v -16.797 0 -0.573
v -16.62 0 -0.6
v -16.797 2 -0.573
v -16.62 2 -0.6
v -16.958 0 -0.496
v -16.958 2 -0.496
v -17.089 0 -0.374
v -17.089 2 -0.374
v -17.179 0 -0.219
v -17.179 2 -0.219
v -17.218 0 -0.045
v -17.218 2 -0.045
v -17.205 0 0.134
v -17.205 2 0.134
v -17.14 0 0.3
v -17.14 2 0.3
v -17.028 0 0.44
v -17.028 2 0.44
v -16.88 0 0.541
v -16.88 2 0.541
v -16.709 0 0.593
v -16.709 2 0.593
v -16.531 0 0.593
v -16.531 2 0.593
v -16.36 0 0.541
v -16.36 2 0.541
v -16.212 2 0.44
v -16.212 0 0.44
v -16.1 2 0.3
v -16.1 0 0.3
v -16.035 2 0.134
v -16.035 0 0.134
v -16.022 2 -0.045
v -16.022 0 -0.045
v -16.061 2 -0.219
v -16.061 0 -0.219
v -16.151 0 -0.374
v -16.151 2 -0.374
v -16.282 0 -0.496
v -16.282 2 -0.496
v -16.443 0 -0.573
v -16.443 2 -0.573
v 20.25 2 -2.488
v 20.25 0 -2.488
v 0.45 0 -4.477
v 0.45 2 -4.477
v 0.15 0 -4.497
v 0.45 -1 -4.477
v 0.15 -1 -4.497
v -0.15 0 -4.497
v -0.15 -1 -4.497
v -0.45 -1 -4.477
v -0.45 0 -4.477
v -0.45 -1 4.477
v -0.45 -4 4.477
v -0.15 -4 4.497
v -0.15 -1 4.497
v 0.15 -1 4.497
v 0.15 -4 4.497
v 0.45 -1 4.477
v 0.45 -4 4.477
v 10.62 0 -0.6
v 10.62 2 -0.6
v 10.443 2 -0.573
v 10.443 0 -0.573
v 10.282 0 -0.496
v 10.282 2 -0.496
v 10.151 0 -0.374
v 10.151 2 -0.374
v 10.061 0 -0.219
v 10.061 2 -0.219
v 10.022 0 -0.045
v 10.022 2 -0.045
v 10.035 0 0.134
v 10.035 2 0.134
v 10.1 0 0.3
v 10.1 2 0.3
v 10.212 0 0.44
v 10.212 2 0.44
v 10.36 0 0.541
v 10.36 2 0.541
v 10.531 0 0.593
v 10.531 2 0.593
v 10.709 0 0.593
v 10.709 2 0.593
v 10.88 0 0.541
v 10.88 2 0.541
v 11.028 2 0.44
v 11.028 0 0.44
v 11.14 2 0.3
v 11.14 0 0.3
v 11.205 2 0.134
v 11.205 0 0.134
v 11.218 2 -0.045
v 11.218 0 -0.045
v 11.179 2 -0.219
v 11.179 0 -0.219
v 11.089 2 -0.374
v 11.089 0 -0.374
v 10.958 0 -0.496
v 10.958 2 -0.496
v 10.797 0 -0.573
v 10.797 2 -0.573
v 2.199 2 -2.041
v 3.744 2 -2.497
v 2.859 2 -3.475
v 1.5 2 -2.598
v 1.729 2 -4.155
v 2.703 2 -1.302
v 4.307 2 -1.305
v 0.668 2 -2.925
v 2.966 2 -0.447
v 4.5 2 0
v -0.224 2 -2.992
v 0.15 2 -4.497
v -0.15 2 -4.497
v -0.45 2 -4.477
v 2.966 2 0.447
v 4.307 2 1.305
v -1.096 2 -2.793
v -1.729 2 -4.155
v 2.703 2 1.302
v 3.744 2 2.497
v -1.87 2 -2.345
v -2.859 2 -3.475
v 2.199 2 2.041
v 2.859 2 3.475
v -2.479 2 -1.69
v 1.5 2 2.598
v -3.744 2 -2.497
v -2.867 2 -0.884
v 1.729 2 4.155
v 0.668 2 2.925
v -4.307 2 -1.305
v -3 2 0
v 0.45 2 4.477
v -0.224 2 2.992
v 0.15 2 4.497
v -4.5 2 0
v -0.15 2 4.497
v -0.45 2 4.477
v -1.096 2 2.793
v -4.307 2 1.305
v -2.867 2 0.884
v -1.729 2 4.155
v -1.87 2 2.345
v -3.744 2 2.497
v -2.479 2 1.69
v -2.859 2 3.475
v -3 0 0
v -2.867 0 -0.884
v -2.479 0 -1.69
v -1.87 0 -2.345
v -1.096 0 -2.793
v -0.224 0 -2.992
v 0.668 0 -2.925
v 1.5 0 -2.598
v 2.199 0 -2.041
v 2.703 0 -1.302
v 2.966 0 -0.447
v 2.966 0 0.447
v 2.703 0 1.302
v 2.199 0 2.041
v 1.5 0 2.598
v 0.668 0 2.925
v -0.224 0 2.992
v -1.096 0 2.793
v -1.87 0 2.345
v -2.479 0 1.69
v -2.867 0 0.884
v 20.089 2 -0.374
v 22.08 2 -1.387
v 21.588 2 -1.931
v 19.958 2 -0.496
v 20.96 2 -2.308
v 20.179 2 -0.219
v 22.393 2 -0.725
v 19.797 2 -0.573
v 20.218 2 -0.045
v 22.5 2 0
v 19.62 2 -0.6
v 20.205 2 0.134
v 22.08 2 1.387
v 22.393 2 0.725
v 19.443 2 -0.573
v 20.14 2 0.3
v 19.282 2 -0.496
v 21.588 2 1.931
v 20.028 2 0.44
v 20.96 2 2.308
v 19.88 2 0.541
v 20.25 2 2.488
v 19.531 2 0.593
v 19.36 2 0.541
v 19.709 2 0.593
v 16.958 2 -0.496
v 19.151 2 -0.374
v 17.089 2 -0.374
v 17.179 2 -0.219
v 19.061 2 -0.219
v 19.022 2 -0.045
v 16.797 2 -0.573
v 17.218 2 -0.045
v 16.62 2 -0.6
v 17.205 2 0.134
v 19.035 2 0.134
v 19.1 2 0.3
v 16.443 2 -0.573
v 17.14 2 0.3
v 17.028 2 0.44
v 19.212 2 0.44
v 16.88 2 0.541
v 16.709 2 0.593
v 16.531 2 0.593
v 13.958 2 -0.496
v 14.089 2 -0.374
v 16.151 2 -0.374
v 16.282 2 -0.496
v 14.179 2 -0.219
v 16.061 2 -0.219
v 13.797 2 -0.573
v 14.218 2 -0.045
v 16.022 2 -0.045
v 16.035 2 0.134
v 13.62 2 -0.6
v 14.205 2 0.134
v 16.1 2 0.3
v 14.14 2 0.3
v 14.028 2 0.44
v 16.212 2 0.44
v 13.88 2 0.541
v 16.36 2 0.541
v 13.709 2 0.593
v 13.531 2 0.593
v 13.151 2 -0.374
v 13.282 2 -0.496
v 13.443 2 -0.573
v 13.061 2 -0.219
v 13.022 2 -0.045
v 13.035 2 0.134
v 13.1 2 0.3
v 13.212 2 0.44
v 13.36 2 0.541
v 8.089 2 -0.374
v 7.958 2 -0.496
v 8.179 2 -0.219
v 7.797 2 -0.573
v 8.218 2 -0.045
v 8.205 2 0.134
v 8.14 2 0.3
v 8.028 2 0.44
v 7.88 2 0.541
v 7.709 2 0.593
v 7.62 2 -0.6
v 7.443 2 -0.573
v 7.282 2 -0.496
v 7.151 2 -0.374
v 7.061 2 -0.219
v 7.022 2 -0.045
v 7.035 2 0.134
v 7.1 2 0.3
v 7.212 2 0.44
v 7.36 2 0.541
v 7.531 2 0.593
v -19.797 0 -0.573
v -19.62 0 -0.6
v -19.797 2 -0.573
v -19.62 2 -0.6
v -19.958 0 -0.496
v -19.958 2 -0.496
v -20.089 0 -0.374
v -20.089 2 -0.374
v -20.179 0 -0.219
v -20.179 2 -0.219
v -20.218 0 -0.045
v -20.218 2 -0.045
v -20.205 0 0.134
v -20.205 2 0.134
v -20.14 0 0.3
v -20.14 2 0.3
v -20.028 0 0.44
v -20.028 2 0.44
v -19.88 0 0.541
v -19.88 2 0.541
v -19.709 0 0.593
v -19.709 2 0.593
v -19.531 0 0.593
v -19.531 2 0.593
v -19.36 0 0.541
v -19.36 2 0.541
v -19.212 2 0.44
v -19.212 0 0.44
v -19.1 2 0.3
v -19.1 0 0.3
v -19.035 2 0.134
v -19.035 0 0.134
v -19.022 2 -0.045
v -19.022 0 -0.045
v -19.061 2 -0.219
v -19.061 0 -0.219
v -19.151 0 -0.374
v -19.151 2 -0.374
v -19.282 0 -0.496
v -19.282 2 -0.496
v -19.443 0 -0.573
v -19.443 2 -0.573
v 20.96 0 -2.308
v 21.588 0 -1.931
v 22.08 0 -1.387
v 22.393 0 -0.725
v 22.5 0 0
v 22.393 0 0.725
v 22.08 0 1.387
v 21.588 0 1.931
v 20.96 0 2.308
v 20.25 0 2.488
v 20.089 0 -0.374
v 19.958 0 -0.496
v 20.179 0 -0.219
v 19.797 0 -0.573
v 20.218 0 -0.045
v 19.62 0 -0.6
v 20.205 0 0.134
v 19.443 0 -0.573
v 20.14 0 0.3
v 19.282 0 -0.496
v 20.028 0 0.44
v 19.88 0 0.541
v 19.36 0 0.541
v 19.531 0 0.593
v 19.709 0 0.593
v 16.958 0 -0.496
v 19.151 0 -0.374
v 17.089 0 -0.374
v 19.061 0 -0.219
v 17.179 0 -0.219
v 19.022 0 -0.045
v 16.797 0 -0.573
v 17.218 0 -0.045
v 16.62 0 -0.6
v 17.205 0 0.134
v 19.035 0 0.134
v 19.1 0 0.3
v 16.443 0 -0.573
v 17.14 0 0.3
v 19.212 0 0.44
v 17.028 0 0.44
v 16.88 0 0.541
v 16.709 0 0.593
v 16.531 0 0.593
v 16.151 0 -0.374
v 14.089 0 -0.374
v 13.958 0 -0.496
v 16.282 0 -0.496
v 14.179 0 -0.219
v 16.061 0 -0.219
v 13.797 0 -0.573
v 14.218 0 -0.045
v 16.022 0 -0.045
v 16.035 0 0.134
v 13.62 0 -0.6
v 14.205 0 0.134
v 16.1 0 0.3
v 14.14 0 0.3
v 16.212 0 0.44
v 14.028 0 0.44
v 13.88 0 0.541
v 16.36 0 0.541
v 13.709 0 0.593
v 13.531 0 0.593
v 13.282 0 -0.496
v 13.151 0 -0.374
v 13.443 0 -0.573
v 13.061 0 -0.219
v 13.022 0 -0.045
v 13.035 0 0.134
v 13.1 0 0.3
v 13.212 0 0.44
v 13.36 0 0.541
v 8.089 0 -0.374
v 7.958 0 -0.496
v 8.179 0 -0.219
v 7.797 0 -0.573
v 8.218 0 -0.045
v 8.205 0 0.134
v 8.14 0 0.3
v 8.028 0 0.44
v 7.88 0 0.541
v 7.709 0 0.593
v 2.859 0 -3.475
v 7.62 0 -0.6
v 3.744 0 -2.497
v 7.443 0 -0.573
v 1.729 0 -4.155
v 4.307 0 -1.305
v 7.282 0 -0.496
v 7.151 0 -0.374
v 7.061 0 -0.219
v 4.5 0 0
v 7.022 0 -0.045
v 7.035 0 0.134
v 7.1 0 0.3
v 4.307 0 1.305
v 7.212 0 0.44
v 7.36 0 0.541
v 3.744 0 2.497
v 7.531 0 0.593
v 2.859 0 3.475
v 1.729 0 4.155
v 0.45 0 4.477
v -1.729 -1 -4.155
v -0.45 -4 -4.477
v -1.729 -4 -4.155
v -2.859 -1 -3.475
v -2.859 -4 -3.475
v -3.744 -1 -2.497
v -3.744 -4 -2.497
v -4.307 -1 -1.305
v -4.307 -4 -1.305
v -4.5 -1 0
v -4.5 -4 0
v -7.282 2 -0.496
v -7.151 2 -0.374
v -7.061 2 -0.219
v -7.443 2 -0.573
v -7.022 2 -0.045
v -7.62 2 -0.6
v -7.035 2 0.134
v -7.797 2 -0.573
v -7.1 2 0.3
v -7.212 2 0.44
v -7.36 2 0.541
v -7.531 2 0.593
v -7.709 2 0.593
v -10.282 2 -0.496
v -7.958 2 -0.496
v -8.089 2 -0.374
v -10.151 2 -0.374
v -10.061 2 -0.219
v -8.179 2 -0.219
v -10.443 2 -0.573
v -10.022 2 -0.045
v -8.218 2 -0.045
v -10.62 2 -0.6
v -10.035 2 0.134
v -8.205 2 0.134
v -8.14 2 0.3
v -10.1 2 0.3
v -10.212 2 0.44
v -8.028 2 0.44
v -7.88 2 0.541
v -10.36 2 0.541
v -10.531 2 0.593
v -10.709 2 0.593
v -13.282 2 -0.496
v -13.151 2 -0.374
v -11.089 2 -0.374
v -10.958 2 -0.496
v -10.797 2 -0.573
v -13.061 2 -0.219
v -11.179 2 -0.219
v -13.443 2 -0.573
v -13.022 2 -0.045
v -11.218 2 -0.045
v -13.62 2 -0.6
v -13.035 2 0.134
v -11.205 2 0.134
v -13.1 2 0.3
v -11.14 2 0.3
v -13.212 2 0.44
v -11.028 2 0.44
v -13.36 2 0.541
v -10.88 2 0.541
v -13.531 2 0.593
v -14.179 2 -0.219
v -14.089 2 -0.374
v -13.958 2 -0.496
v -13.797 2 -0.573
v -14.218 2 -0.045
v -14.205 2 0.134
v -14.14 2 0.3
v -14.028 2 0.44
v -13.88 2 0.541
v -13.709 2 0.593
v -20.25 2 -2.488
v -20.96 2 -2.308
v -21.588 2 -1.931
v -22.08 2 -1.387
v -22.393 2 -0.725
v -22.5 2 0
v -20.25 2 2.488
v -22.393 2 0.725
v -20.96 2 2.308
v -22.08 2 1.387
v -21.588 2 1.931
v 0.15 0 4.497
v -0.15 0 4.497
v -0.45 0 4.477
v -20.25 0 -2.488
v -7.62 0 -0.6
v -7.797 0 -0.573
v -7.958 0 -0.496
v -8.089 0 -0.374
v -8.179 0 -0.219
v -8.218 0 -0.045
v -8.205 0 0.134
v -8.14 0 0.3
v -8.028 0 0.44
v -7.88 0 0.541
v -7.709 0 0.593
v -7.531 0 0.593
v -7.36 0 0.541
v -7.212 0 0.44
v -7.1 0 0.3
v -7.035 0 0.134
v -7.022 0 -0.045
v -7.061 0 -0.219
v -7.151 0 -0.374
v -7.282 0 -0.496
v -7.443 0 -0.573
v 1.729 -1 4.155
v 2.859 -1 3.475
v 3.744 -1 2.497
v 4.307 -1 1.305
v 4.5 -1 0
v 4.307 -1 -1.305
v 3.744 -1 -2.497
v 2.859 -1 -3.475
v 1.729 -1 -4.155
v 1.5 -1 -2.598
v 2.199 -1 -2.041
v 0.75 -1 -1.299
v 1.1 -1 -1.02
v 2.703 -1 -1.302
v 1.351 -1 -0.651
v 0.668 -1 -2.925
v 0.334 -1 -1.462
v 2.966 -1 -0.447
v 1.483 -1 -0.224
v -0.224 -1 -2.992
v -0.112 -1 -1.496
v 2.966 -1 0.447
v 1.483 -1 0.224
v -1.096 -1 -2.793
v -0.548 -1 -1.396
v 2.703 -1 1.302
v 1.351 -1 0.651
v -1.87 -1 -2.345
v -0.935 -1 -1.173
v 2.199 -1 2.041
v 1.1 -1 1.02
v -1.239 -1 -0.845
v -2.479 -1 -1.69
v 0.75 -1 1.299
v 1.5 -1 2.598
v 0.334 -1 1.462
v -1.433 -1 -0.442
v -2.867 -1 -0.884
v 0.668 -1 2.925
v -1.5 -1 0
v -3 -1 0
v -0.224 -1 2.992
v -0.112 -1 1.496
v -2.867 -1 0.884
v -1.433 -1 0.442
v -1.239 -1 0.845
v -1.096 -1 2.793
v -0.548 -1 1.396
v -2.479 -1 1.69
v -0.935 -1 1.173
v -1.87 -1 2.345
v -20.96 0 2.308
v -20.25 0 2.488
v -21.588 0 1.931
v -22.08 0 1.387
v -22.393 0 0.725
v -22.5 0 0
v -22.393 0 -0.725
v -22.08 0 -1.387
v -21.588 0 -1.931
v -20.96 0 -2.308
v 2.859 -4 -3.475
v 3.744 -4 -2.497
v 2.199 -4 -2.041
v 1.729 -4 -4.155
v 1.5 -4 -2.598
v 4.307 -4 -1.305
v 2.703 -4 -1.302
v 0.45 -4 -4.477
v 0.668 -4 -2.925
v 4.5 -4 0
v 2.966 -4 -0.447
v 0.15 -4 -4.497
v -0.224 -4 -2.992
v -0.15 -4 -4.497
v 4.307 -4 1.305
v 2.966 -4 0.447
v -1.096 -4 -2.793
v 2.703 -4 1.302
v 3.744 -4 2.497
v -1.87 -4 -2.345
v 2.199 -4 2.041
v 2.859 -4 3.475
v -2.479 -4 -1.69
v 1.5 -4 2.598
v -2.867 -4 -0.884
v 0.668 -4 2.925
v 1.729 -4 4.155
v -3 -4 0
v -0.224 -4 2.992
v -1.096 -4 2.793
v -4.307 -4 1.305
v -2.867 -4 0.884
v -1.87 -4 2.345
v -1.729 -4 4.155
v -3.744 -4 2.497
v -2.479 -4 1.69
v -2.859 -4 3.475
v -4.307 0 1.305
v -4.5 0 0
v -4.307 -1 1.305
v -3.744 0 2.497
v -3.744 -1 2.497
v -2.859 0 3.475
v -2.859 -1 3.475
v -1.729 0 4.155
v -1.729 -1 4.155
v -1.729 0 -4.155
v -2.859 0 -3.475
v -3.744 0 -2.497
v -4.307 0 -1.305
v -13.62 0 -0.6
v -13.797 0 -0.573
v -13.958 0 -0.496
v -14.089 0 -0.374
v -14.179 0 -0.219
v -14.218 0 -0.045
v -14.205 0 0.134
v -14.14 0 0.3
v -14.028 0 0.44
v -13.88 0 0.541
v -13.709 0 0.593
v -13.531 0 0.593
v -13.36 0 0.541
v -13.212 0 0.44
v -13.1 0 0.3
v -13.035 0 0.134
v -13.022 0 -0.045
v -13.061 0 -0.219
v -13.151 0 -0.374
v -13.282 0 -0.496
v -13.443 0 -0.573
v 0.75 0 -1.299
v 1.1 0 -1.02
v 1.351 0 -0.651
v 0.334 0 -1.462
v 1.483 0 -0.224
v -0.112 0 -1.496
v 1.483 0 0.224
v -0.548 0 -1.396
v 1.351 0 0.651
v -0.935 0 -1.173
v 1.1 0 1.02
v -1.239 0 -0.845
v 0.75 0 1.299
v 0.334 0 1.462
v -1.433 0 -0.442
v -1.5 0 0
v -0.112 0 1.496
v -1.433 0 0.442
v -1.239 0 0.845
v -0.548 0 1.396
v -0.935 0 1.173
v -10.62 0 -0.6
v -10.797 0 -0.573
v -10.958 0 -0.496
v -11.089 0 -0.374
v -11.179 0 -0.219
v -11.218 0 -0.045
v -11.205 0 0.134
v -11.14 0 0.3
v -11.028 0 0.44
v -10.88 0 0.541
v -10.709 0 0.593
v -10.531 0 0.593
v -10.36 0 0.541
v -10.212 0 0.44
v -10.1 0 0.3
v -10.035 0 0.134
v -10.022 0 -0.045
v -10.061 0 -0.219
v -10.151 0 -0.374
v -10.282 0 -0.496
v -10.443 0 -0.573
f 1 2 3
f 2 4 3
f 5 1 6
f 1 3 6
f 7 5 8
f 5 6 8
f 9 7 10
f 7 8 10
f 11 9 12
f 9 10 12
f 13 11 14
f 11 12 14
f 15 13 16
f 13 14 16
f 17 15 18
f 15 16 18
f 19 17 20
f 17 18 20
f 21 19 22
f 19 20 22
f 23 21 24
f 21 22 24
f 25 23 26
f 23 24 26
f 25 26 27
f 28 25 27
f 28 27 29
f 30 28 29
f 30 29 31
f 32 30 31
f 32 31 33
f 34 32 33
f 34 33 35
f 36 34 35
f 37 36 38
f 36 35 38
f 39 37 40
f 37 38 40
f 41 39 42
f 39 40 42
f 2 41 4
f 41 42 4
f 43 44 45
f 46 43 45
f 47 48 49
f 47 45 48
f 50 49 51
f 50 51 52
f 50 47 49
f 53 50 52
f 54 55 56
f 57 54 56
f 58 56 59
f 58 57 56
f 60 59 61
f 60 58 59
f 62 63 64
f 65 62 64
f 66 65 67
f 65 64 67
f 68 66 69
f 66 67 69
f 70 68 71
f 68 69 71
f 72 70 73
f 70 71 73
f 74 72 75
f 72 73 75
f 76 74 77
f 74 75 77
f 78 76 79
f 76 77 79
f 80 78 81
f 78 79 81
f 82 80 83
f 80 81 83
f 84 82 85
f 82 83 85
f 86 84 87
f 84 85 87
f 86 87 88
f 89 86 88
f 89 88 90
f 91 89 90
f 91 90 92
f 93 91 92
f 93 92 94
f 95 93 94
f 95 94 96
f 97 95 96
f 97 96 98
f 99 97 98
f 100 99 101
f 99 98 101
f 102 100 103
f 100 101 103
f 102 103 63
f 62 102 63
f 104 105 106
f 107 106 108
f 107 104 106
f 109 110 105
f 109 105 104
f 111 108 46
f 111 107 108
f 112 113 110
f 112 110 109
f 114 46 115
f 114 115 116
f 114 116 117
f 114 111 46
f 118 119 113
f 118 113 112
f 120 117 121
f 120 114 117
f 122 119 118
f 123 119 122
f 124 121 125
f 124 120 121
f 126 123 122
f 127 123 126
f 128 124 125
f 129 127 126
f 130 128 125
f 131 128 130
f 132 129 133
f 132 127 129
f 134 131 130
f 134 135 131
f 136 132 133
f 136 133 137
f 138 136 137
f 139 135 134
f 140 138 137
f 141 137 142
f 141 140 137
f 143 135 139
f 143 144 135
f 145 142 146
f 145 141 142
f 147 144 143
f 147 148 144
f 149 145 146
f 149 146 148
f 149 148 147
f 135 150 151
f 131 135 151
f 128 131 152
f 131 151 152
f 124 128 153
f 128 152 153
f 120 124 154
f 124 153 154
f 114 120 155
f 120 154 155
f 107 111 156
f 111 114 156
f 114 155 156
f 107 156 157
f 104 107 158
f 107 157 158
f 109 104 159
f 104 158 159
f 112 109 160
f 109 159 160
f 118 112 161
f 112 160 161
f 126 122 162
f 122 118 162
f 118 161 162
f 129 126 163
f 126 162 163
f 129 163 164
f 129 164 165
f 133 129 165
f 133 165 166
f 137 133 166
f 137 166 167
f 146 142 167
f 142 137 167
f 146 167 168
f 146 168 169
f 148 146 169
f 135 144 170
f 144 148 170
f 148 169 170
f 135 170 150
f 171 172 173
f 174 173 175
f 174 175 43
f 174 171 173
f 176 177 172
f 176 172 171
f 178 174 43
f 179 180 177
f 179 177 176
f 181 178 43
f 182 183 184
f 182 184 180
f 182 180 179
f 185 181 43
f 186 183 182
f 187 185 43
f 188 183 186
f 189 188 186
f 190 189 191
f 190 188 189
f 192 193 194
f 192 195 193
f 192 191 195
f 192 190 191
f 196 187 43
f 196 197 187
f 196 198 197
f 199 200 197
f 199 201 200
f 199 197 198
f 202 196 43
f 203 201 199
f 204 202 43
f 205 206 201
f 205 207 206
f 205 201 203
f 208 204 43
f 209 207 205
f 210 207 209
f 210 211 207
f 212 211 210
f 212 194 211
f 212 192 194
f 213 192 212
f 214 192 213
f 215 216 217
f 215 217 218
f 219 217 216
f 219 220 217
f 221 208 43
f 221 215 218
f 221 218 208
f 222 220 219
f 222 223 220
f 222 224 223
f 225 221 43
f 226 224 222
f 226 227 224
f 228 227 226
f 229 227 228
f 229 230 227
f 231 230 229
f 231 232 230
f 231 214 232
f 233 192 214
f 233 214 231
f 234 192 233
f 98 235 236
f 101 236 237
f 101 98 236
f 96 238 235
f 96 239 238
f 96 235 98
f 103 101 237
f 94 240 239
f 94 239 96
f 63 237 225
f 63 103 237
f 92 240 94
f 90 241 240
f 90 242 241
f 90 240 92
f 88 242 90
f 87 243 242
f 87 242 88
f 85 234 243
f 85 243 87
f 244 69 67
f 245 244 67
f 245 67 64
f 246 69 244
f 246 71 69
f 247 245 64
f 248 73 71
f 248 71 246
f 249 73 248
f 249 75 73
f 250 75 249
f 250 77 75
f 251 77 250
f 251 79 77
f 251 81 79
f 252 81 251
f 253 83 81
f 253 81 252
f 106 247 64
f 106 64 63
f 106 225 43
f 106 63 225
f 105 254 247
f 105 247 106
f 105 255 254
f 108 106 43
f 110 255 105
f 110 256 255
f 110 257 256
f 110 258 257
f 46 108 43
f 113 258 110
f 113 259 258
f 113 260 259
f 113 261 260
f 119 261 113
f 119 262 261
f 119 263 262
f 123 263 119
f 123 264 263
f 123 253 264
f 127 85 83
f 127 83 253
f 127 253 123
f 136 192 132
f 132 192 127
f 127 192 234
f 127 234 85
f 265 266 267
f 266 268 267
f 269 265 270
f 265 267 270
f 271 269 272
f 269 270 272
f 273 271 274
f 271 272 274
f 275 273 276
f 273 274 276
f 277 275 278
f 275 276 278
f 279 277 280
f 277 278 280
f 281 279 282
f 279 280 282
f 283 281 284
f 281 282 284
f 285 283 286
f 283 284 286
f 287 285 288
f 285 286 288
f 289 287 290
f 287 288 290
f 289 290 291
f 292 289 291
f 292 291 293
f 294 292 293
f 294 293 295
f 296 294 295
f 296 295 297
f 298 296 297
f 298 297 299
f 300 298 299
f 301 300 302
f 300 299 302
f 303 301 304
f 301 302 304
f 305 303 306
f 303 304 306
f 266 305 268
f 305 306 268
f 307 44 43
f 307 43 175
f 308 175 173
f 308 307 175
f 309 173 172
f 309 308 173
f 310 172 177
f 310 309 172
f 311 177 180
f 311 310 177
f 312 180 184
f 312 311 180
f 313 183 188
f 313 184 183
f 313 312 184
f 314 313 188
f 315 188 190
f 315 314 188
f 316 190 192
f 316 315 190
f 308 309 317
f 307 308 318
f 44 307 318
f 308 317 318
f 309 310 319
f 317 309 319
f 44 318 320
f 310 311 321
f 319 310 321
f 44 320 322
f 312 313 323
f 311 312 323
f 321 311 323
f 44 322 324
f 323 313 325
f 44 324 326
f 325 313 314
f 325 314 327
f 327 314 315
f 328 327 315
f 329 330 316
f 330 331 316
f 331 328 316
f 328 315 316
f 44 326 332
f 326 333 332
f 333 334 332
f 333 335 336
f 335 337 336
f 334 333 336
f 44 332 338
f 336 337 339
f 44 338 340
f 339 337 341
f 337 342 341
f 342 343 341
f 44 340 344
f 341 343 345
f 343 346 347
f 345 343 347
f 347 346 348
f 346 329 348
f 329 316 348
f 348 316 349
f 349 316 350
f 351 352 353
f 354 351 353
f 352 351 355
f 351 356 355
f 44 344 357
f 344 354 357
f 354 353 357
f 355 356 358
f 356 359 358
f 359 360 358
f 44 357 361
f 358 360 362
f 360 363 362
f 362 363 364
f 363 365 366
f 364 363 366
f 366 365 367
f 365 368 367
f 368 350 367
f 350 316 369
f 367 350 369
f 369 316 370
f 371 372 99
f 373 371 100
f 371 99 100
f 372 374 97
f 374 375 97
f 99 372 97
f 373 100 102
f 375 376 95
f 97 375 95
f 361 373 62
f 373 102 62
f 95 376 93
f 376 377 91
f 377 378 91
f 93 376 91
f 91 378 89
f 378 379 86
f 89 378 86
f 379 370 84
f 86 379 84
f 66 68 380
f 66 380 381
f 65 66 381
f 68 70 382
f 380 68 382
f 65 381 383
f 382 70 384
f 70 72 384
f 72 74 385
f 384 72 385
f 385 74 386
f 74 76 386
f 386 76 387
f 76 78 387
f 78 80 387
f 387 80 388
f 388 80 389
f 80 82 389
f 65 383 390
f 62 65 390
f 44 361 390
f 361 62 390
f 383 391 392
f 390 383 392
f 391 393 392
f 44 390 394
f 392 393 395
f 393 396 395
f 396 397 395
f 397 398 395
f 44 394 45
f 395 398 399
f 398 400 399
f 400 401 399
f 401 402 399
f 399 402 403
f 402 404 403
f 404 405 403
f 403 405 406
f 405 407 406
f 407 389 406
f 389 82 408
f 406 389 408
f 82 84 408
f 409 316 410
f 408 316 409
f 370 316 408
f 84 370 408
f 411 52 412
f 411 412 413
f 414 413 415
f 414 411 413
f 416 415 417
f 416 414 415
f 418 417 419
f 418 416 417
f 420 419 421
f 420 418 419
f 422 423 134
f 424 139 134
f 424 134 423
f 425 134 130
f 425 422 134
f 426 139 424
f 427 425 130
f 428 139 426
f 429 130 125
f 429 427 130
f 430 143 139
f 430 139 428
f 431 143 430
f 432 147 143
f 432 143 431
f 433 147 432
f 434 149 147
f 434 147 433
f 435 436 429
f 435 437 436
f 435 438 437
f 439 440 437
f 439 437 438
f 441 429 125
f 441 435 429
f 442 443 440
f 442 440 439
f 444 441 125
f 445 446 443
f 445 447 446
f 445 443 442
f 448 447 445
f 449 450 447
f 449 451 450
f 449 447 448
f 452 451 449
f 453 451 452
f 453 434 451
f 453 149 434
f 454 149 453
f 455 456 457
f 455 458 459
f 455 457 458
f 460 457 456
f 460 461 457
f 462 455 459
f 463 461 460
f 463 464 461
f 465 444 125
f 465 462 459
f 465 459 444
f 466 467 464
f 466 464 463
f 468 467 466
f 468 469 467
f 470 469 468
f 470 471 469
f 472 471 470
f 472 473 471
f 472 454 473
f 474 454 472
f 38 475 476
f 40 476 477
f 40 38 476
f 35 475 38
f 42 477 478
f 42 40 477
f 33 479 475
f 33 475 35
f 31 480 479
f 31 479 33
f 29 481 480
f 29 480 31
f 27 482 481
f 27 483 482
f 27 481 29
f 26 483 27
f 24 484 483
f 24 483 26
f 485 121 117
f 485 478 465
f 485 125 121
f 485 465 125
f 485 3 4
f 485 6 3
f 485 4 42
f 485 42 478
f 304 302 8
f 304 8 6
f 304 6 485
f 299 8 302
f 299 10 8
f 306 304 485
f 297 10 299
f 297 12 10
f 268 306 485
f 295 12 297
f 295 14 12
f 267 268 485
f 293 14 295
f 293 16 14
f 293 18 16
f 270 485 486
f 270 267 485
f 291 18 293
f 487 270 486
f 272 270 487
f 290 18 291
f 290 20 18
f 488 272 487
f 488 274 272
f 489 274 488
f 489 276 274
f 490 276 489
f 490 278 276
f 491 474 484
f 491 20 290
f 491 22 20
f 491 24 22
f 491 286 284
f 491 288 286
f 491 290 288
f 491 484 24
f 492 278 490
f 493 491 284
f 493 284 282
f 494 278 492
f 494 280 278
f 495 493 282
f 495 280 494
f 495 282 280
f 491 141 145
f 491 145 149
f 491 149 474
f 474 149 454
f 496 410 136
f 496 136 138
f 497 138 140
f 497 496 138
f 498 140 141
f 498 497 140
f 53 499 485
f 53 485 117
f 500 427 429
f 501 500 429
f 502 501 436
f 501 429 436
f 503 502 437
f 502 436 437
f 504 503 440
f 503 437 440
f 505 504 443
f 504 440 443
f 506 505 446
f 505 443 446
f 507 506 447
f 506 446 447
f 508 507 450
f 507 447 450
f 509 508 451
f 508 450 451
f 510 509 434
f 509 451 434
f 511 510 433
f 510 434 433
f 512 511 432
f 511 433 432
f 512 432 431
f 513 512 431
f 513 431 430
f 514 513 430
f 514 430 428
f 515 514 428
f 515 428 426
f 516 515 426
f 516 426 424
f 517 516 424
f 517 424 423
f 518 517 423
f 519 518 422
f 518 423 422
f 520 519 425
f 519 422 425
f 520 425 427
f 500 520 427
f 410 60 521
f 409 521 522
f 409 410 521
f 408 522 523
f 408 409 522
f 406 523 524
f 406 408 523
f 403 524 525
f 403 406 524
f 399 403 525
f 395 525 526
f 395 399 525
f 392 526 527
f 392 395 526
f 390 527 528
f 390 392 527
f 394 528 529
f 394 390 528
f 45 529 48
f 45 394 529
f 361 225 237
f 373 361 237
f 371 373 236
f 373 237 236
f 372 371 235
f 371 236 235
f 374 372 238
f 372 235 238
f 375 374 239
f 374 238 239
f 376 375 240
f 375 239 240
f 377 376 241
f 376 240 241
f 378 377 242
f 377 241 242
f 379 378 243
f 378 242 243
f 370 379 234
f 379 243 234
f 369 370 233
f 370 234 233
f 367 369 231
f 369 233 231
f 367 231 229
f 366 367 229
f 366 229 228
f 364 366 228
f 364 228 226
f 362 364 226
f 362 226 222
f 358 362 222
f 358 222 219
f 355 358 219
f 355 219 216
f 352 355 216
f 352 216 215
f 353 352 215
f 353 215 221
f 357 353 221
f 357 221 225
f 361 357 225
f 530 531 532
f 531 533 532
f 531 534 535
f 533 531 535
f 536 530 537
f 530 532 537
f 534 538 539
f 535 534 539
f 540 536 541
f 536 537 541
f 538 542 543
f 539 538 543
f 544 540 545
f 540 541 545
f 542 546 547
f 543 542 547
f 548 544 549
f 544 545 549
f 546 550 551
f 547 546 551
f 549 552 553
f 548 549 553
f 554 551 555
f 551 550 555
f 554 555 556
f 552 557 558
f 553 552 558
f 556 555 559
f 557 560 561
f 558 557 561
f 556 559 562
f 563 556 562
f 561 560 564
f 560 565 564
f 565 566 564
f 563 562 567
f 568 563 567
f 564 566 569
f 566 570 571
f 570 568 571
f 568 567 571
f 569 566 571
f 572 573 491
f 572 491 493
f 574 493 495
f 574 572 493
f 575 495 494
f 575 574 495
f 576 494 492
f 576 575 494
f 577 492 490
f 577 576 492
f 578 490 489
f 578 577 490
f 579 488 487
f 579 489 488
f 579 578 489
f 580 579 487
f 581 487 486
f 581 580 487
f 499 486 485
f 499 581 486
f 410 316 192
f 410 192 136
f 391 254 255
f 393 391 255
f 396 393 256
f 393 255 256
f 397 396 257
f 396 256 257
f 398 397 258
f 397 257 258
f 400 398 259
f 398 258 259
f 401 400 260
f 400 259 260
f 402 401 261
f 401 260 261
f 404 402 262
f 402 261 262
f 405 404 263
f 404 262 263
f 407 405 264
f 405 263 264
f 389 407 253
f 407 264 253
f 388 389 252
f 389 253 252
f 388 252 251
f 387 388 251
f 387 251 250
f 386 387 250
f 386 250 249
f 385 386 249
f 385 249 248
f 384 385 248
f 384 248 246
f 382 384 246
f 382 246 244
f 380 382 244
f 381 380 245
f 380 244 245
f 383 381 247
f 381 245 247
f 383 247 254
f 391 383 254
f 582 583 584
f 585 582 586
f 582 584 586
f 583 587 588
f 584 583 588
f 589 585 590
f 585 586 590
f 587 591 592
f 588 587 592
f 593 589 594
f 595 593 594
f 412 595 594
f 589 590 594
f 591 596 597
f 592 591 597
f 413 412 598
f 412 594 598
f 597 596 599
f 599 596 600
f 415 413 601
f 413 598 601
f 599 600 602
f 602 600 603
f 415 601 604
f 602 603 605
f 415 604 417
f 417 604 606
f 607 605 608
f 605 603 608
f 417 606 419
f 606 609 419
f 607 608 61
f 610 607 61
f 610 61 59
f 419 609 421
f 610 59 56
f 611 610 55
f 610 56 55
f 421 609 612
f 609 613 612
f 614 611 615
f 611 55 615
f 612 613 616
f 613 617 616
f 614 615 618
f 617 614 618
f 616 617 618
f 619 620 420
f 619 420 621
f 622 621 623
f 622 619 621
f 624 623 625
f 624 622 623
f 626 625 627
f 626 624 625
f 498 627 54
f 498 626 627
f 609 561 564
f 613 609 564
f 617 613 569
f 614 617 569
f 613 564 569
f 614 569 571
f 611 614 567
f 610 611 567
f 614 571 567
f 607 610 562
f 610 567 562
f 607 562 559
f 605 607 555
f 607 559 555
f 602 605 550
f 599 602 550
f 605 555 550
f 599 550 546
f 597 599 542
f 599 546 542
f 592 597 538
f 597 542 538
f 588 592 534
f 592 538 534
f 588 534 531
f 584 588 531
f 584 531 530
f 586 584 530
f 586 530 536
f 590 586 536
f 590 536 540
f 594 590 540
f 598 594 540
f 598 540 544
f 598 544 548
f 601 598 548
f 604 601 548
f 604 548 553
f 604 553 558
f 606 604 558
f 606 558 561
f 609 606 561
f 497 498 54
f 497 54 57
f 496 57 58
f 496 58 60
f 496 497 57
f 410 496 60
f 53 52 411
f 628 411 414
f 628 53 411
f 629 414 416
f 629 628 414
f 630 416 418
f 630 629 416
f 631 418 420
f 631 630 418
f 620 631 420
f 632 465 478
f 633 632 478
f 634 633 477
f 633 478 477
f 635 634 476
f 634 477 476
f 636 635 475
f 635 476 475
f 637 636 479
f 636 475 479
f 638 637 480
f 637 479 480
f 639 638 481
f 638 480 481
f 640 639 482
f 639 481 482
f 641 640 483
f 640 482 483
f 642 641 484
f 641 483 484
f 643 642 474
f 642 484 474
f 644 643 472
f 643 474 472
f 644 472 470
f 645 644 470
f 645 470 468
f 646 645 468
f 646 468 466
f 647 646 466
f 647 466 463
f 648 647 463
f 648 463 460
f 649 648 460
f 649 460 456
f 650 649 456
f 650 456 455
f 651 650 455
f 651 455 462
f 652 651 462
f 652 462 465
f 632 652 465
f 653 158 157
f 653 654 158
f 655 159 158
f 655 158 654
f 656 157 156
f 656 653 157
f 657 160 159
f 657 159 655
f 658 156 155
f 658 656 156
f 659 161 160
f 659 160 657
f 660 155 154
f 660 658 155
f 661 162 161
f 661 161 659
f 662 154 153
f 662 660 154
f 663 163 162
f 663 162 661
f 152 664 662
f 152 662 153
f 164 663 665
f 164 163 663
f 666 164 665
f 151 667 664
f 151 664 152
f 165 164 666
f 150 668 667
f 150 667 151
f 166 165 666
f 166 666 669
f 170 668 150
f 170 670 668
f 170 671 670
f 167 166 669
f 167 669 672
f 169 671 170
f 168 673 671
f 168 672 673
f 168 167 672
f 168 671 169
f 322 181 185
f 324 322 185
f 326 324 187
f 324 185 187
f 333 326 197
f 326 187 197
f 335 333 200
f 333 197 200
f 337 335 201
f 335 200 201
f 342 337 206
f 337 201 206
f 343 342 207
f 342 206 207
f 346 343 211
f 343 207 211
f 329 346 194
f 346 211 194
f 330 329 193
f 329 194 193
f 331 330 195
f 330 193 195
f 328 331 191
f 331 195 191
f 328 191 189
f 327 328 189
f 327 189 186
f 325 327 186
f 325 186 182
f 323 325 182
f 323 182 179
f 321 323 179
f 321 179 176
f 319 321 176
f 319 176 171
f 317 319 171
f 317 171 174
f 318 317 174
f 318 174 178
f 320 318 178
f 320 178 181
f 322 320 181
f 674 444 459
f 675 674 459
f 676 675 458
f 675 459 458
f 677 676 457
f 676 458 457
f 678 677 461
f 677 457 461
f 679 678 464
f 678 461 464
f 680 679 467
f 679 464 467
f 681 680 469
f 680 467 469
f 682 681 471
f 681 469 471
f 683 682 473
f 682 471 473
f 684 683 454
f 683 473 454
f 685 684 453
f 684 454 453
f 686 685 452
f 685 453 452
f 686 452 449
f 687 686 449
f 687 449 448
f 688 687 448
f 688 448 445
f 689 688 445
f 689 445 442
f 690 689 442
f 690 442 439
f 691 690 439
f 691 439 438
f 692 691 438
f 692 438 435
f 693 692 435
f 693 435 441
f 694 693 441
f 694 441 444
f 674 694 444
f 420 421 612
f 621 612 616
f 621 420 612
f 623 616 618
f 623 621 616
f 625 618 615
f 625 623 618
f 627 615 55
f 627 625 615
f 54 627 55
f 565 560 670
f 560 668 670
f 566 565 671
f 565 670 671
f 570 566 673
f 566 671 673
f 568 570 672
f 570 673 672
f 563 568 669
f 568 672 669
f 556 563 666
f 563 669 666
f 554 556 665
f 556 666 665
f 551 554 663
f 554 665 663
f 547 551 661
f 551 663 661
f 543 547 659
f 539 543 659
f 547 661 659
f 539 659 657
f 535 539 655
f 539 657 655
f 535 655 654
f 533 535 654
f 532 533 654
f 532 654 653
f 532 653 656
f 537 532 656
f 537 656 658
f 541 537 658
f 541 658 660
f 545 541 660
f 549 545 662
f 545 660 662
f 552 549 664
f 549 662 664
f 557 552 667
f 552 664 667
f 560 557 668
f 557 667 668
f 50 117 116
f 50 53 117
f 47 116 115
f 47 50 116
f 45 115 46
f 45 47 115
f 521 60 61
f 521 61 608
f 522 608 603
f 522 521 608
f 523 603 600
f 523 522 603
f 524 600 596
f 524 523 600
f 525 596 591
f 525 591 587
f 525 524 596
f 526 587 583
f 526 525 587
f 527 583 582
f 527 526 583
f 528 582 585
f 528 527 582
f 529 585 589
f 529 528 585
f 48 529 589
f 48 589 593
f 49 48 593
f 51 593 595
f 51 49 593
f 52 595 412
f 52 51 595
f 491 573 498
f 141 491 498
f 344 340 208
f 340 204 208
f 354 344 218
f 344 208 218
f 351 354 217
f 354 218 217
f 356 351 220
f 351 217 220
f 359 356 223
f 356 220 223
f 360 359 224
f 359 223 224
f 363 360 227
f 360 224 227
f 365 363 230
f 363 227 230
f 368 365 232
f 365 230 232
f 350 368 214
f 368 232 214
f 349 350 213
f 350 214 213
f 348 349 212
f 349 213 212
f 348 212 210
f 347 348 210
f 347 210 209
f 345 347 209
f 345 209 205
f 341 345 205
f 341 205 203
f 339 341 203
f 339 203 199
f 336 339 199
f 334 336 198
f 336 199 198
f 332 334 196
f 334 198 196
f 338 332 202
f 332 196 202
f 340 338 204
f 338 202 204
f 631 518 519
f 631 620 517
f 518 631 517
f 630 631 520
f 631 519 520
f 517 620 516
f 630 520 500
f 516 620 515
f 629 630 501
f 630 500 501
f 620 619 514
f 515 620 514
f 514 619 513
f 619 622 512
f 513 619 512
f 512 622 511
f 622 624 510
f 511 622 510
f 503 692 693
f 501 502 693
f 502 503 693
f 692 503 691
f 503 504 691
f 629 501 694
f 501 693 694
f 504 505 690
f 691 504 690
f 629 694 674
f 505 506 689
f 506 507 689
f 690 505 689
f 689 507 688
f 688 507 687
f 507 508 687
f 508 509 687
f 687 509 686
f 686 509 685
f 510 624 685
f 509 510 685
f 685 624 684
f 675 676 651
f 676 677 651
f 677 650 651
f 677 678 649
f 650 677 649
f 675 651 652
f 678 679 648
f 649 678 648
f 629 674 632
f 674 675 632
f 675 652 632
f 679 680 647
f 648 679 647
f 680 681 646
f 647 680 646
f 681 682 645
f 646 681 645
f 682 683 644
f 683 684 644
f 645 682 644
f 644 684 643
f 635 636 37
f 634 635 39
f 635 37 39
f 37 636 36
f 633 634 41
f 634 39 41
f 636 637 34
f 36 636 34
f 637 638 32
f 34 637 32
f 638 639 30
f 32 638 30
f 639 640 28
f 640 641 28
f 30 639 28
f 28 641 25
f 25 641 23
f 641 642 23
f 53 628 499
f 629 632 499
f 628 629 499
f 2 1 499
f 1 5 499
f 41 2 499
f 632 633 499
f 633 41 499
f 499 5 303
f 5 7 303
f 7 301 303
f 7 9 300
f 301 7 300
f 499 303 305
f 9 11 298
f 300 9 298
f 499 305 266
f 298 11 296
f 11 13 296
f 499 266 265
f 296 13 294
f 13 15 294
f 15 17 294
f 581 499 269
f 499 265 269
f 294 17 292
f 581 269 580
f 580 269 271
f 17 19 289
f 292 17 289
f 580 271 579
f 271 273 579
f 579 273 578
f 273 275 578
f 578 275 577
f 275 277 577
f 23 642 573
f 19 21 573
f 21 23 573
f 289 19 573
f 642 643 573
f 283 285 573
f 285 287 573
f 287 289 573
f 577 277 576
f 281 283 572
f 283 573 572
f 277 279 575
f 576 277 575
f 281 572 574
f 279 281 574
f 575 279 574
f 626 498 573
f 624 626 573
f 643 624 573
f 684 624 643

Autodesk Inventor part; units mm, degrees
ref_plane "YZ Plane" through (0, 0, 0) normal (1, 0, 0) x (0, 1, 0)
ref_plane "XZ Plane" through (0, 0, 0) normal (0, 1, 0) x (-1, 0, 0)
ref_plane "XY Plane" through (0, 0, 0) normal (0, 0, 1) x (1, 0, 0)
sketch "Sketch1" plane through (0, 0, 0) normal (0, 1, 0) x (-1, 0, 0)
  circle A0 centre (0, 0) radius 3
  circle A1 centre (0, 0) radius 4.5
  line L0 (0, 0) -> (7.62, 0) construction
  circle A2 centre (0, 0) radius 1.5
  line L1 (0, 0) -> (0, 4.5) construction
  arc A3 (20.25, -2.4875) -> (20.25, 2.4875) centre (20, 0) ccw
  line L2 (20, 0) -> (0, 0)
  arc A4 (-20.25, 2.4875) -> (-20.25, -2.4875) centre (-20, 0) ccw
  line L3 (20.25, 2.4875) -> (0.45, 4.4774)
  line L4 (20.25, -2.4875) -> (0.45, -4.4774)
  line L5 (-20.25, -2.4875) -> (-0.45, -4.4774)
  line L6 (-20.25, 2.4875) -> (-0.45, 4.4774)
  point P0 (10.62, 0)
  point P1 (13.62, 0)
  point P2 (16.62, 0)
  point P3 (19.62, 0)
  point P4 (-7.62, 0)
  point P5 (-7.62, 0)
  point P6 (-10.62, 0)
  point P7 (-13.62, 0)
  point P8 (-16.62, 0)
  point P9 (-19.62, 0)
  dimension "d0" = 6
  dimension "d1" = 9
  dimension "d2" = 7.62
  dimension "d6" = 3
  dimension "d9" = 3
  dimension "d14" = 2.5
  dimension "d15" = 40
extrude "Extrusion1" add sketch "Sketch1" along normal blind 2 contours A1 | A1 L3 A3 L4 | A1 L5 A4 L6
extrude "Extrusion2" add sketch "Sketch1" against normal blind 1 contours A0 | A1
extrude "Extrusion3" add sketch "Sketch1" against normal blind 4 contours A1
hole "Hole1" at (-7.62, 0, 0) at (-10.62, 0, 0) at (-13.62, 0, 0) at (-16.62, 0, 0) at (-19.62, 0, 0) at (19.62, 0, 0) at (16.62, 0, 0) at (13.62, 0, 0) at (10.62, 0, 0) at (7.62, 0, 0) direction (0, 1, 0) diameter 1.2 depth 8 tip angle 118
properties part number "servo arm HK15138 2 cut to 1"
